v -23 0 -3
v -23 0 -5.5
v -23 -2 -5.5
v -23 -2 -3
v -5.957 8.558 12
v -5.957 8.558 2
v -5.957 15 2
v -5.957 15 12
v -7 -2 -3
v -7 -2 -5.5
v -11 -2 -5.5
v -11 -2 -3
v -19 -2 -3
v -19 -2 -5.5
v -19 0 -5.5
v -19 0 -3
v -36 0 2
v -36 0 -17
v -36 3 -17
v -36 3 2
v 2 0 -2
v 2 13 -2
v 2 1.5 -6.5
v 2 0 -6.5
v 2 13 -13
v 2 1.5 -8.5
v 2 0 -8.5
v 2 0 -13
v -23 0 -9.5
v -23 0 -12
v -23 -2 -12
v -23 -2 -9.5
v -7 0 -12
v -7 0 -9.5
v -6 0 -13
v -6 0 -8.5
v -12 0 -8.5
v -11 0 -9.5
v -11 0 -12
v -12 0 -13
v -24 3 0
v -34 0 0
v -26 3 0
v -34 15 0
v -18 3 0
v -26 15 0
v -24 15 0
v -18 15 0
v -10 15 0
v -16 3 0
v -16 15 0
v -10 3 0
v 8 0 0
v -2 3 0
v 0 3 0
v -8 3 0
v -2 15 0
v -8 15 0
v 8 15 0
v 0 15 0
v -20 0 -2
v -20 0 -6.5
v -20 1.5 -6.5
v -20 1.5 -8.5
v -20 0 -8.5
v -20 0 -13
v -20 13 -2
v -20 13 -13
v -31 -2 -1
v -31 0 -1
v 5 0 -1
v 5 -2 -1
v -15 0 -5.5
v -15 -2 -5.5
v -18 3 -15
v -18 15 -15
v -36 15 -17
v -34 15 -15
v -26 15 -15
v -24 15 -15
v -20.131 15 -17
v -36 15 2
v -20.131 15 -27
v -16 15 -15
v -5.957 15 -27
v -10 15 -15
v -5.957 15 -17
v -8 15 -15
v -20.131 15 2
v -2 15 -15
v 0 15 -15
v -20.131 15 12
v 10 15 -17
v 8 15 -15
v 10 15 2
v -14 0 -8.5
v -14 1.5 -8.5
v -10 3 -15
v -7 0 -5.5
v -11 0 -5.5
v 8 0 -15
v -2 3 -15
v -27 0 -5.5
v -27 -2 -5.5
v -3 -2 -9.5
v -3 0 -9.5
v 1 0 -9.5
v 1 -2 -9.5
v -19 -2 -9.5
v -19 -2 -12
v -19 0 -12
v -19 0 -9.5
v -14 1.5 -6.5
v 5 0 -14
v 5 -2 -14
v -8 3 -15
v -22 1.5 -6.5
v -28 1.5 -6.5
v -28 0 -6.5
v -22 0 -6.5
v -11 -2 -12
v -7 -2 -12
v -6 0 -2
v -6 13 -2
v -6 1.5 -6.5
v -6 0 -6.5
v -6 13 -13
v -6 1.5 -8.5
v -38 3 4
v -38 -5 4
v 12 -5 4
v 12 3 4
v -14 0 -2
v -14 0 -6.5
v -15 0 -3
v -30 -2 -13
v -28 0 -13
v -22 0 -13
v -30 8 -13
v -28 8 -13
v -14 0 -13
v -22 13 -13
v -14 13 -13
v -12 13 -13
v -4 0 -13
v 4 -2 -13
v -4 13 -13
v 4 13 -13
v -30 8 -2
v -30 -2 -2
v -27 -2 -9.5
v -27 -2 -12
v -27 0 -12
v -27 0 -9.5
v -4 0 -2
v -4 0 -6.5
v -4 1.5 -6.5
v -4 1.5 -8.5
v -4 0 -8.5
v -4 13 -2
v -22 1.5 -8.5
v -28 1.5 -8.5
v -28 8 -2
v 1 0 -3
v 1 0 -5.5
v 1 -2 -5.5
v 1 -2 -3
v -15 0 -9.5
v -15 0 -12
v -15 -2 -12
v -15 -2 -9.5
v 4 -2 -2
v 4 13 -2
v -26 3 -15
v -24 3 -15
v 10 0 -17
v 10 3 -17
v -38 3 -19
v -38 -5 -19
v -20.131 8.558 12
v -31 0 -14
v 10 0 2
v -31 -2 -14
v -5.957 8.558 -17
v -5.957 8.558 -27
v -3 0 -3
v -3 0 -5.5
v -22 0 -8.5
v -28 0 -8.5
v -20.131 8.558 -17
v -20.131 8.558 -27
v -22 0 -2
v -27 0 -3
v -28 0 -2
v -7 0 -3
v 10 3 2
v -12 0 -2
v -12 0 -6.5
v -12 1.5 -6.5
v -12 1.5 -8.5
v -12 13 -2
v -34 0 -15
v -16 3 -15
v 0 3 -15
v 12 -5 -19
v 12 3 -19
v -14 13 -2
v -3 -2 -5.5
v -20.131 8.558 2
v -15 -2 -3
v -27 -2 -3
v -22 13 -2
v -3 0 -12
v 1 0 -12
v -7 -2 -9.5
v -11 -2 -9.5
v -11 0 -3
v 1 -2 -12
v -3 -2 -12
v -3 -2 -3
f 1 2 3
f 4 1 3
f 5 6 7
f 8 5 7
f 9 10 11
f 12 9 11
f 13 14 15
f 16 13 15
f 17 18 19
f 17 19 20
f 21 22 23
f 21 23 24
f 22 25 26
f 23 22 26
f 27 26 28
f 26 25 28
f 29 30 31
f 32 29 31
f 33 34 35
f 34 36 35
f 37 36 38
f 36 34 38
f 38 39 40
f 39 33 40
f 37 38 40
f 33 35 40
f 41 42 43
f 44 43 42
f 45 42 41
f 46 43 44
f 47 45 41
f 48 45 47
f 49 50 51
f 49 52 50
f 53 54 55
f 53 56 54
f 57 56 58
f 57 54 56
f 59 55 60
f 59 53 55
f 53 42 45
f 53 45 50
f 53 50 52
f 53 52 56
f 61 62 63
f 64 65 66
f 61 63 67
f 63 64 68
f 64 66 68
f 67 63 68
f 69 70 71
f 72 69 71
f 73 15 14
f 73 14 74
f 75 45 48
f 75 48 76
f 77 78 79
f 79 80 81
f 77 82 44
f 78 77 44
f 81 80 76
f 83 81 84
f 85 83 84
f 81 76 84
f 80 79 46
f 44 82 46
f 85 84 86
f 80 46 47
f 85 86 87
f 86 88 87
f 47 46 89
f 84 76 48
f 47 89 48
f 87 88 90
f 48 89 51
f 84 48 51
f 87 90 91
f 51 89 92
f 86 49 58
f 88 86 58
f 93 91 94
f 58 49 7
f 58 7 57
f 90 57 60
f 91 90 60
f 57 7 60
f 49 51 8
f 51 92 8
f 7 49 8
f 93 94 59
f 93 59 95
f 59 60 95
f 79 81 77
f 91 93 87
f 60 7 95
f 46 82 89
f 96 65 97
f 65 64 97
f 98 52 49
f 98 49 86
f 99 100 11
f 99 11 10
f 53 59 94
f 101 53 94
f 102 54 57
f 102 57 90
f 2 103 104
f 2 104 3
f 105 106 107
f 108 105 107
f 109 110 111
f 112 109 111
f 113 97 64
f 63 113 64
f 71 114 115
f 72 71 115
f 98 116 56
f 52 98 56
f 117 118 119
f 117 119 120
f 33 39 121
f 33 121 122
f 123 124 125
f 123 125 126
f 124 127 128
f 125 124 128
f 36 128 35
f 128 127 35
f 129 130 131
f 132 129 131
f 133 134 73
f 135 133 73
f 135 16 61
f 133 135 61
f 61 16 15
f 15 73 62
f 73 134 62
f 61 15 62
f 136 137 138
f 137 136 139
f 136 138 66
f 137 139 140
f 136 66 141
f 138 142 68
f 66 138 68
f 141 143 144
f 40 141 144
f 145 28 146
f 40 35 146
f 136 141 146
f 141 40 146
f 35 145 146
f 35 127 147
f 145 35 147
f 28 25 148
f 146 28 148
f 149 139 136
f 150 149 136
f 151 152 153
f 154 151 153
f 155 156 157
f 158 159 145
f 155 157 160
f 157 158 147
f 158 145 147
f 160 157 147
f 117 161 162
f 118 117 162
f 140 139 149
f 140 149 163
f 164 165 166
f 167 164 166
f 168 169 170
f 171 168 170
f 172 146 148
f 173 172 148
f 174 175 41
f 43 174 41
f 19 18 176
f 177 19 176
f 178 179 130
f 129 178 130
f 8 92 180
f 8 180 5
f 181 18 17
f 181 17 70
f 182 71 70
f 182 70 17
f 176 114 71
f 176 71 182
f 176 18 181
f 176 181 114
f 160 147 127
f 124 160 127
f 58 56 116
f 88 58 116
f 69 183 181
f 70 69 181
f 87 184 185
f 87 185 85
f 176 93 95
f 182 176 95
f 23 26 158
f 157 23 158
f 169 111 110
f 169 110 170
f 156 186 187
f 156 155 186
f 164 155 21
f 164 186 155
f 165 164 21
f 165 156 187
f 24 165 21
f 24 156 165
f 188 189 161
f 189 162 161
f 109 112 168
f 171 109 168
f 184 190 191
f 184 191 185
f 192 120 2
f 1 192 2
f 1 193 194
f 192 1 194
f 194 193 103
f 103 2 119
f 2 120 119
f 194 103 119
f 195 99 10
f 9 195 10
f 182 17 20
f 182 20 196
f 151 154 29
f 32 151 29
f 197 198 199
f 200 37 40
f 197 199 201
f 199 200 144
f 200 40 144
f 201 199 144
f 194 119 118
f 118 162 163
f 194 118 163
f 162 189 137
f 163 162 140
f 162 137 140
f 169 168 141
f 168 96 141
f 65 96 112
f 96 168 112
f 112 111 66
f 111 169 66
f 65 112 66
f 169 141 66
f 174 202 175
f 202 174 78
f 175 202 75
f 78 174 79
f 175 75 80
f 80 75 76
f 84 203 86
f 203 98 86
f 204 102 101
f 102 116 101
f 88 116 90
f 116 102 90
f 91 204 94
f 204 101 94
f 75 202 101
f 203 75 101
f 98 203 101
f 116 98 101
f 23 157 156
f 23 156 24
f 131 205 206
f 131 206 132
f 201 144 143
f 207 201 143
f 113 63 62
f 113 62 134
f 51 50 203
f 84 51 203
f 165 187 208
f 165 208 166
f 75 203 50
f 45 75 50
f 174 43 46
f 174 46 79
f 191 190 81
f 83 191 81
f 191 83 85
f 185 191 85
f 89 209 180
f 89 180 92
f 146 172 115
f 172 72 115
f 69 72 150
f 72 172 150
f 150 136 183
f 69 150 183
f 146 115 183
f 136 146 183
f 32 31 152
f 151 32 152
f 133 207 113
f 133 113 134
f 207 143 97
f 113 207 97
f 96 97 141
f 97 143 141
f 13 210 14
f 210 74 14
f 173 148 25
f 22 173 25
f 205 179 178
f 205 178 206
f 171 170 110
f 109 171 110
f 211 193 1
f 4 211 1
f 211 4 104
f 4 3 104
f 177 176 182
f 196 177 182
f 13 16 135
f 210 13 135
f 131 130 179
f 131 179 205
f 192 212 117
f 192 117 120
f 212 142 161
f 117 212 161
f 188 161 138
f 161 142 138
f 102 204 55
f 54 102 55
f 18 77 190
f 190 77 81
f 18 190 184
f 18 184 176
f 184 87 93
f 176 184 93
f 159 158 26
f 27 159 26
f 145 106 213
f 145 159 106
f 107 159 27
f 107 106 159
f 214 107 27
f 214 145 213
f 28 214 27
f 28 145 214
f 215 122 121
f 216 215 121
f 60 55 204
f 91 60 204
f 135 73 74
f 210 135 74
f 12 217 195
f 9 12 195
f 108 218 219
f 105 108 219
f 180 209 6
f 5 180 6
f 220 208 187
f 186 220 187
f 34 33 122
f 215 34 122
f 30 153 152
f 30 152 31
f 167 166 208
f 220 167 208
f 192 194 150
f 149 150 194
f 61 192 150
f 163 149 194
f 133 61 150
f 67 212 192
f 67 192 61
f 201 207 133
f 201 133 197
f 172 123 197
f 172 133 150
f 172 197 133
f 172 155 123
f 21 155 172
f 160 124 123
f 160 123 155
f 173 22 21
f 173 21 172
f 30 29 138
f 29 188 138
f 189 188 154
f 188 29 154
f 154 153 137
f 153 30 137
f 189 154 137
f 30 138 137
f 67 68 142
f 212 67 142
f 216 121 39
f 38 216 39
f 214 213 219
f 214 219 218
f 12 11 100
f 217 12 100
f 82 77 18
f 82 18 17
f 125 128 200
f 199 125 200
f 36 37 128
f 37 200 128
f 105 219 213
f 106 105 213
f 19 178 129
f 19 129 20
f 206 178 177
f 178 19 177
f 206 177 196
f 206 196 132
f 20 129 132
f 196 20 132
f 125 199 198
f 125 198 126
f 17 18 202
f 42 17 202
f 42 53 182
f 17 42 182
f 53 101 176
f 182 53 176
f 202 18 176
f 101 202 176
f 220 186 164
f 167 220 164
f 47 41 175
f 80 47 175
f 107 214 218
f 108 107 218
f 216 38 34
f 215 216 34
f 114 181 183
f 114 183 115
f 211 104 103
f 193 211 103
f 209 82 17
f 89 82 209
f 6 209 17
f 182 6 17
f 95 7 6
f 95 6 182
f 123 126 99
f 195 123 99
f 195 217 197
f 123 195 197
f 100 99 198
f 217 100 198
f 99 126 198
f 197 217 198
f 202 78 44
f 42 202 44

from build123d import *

# Parameters (mm, degrees)
SKETCH1_W                 = 6
SKETCH1_H                 = 15
BOSS_EXTRUDE1_DEPTH       = 15
SKETCH2_W                 = 2
SKETCH2_H                 = 11
CUT_EXTRUDE1_DEPTH        = 13
SKETCH3_W                 = 15
SKETCH3_H                 = 3
BOSS_EXTRUDE2_DEPTH       = 2
LPATTERN1_COUNT           = 5
LPATTERN1_PITCH           = 8
SKETCH6_W                 = 15
SKETCH6_H                 = 15
BOSS_EXTRUDE4_DEPTH       = 2
SKETCH8_W                 = 15
SKETCH8_H                 = 12
BOSS_EXTRUDE5_DEPTH       = 2
SKETCH9_W                 = 34
SKETCH9_H                 = 2
CUT_EXTRUDE2_DEPTH        = 1.5
SKETCH13_W                = 36
SKETCH13_H                = 13
SKETCH13_W_2              = 34
SKETCH13_H_2              = 11
BOSS_EXTRUDE9_DEPTH       = 2
SKETCH15_W                = 4
SKETCH15_H                = 2.5
BOSS_EXTRUDE10_DEPTH      = 2
LPATTERN2_COUNT           = 4
LPATTERN2_PITCH           = 8
BOSS_EXTRUDE11_DEPTH      = 5
BOSS_EXTRUDE11_DEPTH_BACK = 15
SKETCH17_W                = 46
SKETCH17_H                = 19
SPLIT2_START              = -5
SPLIT2_OUTLINE_W          = 46
SPLIT2_OUTLINE_H          = 19
SPLIT2_DEPTH              = 5
SPLIT2_2_OUTLINE_W        = 2
SPLIT2_2_OUTLINE_H        = 11
SPLIT2_2_DEPTH            = 13
SPLIT2_3_OUTLINE_W        = 6
SPLIT2_3_OUTLINE_H        = 2
SPLIT2_3_DEPTH            = 1.5
SPLIT2_START_2            = -13
SPLIT2_4_DEPTH            = 11
SPLIT2_START_3            = -17
SPLIT2_5_DEPTH            = 19
SPLIT2_6_OUTLINE_W        = 36
SPLIT2_6_OUTLINE_H        = 2
SPLIT2_6_DEPTH            = 3
SPLIT2_START_4            = -1
SPLIT2_7_OUTLINE_W        = 36
SPLIT2_7_OUTLINE_H        = 2
SPLIT2_7_DEPTH            = 3
SPLIT2_START_5            = -8.5
SPLIT2_8_DEPTH            = 2
SPLIT2_START_6            = -9.5
SPLIT2_9_OUTLINE_W        = 4
SPLIT2_9_OUTLINE_H        = 2
SPLIT2_9_DEPTH            = 4
SPLIT2_10_OUTLINE_W       = 4
SPLIT2_10_OUTLINE_H       = 2
SPLIT2_10_DEPTH           = 1
SPLIT2_START_7            = -3
SPLIT2_11_OUTLINE_W       = 4
SPLIT2_11_OUTLINE_H       = 2
SPLIT2_11_DEPTH           = 1
SKETCH18_W                = 14.174743238
SKETCH18_H                = 6.442150942
BOSS_EXTRUDE12_DEPTH      = 10
SKETCH19_W                = 50
SKETCH19_H                = 23
SKETCH19_W_2              = 46
SKETCH19_H_2              = 19
BOSS_EXTRUDE13_DEPTH      = 8
SKETCH20_W                = 2
SKETCH20_H                = 11
CUT_EXTRUDE3_DEPTH        = 5


# Read off the part's stored shape, not the designer's step: Split2
with BuildPart() as part:
    # Sketch1 → Boss-Extrude1 (new body)
    with BuildSketch(Plane(origin=(0, 0, 0), x_dir=(1, 0, 0), z_dir=(0, 1, 0))):
        with Locations((3, 7.5)):
            Rectangle(SKETCH1_W, SKETCH1_H)
    extrude(amount=BOSS_EXTRUDE1_DEPTH)

    # Sketch2 → Cut-Extrude1 (cut)
    with BuildSketch(Plane.XZ):
        with Locations((3, -7.5)):
            Rectangle(SKETCH2_W, SKETCH2_H)
    extrude(amount=-CUT_EXTRUDE1_DEPTH, mode=Mode.SUBTRACT)

    # Sketch3 → Boss-Extrude2 (add)
    with BuildSketch(Plane.ZY):
        with Locations((-7.5, 1.5)):
            Rectangle(SKETCH3_W, SKETCH3_H)
    extrude(amount=BOSS_EXTRUDE2_DEPTH)


with BuildPart() as lpattern1_1:
    # LPattern1: pattern copy
    add(part.part.moved(Location(Vector(-1, 0, 0) * (1 * LPATTERN1_PITCH))))


with BuildPart() as lpattern1_2:
    # LPattern1: pattern copy
    add(part.part.moved(Location(Vector(-1, 0, 0) * (2 * LPATTERN1_PITCH))))


with BuildPart() as lpattern1_3:
    # LPattern1: pattern copy
    add(part.part.moved(Location(Vector(-1, 0, 0) * (3 * LPATTERN1_PITCH))))


with BuildPart() as lpattern1_4:
    # LPattern1: pattern copy
    add(part.part.moved(Location(Vector(-1, 0, 0) * (4 * LPATTERN1_PITCH))))


with BuildPart() as lpattern1_1_1:
    add(lpattern1_1.part)

    # Combine1: union LPattern1_2, LPattern1_3, part, LPattern1_4
    add(lpattern1_2.part)
    add(lpattern1_3.part)
    add(part.part)
    add(lpattern1_4.part)

    # Sketch6 → Boss-Extrude4 (add)
    with BuildSketch(Plane(origin=(6, 0, 0), x_dir=(0, 0, -1), z_dir=(1, 0, 0))):
        with Locations((7.5, 7.5)):
            Rectangle(SKETCH6_W, SKETCH6_H)
    extrude(amount=BOSS_EXTRUDE4_DEPTH)

    # Sketch8 → Boss-Extrude5 (add)
    with BuildSketch(Plane.ZY.offset(32)):
        with Locations((-7.5, 9)):
            Rectangle(SKETCH8_W, SKETCH8_H)
    extrude(amount=BOSS_EXTRUDE5_DEPTH)

    # Sketch9 → Cut-Extrude2 (cut)
    with BuildSketch(Plane.XZ):
        with Locations((-13, -7.5)):
            Rectangle(SKETCH9_W, SKETCH9_H)
    extrude(amount=-CUT_EXTRUDE2_DEPTH, mode=Mode.SUBTRACT)

    # Sketch13 → Boss-Extrude9 (add)
    with BuildSketch(Plane(origin=(0, 0, 0), x_dir=(-1, 0, 0), z_dir=(0, -1, 0))):
        with Locations((13, 7.5)):
            Rectangle(SKETCH13_W, SKETCH13_H)
        with Locations((13, 7.5)):
            Rectangle(SKETCH13_W_2, SKETCH13_H_2, mode=Mode.SUBTRACT)
    extrude(amount=BOSS_EXTRUDE9_DEPTH)

    # Sketch15 → Boss-Extrude10 (add)
    with BuildSketch(Plane(origin=(0, 0, 0), x_dir=(-1, 0, 0), z_dir=(0, -1, 0))):
        with Locations((25, 4.25)):
            Rectangle(SKETCH15_W, SKETCH15_H)
        with Locations((25, 10.75)):
            Rectangle(SKETCH15_W, SKETCH15_H)
    boss_extrude10 = extrude(amount=BOSS_EXTRUDE10_DEPTH)

    # LPattern2: Boss-Extrude10 ×4
    with Locations(*[(i * LPATTERN2_PITCH, 0, 0) for i in range(1, LPATTERN2_COUNT)]):
        add(boss_extrude10)


with BuildPart() as body_2:
    # Sketch17 → Boss-Extrude11 (new, two sides: drawn at the far end of the back side and taken through both)
    with BuildSketch(Plane.XZ.offset(-BOSS_EXTRUDE11_DEPTH_BACK)):
        with Locations((-13, -7.5)):
            Rectangle(SKETCH17_W, SKETCH17_H)
    extrude(amount=BOSS_EXTRUDE11_DEPTH + BOSS_EXTRUDE11_DEPTH_BACK)

    # Combine3: cut LPattern1_1
    add(lpattern1_1_1.part, mode=Mode.SUBTRACT)

    # Split2 outline → Split2 (cut)
    with BuildSketch(Plane(origin=(0, 0, 0), x_dir=(1, 0, 0), z_dir=(0, 1, 0)).offset(SPLIT2_START)):
        with Locations((-13, 7.5)):
            Rectangle(SPLIT2_OUTLINE_W, SPLIT2_OUTLINE_H)
    extrude(amount=SPLIT2_DEPTH, mode=Mode.SUBTRACT)

    # Split2 2 outline → Split2 2 (cut)
    with BuildSketch(Plane(origin=(0, 0, 0), x_dir=(1, 0, 0), z_dir=(0, 1, 0))):
        with Locations((3, 7.5)):
            Rectangle(SPLIT2_2_OUTLINE_W, SPLIT2_2_OUTLINE_H)
        with Locations((-5, 7.5)):
            Rectangle(SPLIT2_2_OUTLINE_W, SPLIT2_2_OUTLINE_H)
        with Locations((-13, 7.5)):
            Rectangle(SPLIT2_2_OUTLINE_W, SPLIT2_2_OUTLINE_H)
        with Locations((-21, 7.5)):
            Rectangle(SPLIT2_2_OUTLINE_W, SPLIT2_2_OUTLINE_H)
        with Locations((-29, 7.5)):
            Rectangle(SPLIT2_2_OUTLINE_W, SPLIT2_2_OUTLINE_H)
    extrude(amount=SPLIT2_2_DEPTH, mode=Mode.SUBTRACT)

    # Split2 3 outline → Split2 3 (cut)
    with BuildSketch(Plane(origin=(0, 0, 0), x_dir=(1, 0, 0), z_dir=(0, 1, 0))):
        with Locations((-1, 7.5)):
            Rectangle(SPLIT2_3_OUTLINE_W, SPLIT2_3_OUTLINE_H)
        with Locations((-9, 7.5)):
            Rectangle(SPLIT2_3_OUTLINE_W, SPLIT2_3_OUTLINE_H)
        with Locations((-17, 7.5)):
            Rectangle(SPLIT2_3_OUTLINE_W, SPLIT2_3_OUTLINE_H)
        with Locations((-25, 7.5)):
            Rectangle(SPLIT2_3_OUTLINE_W, SPLIT2_3_OUTLINE_H)
    extrude(amount=SPLIT2_3_DEPTH, mode=Mode.SUBTRACT)

    # Sketch18 → Boss-Extrude12 (add)
    with BuildSketch(Plane.XY.offset(2)):
        with Locations((-13.043964225, 11.778924529)):
            Rectangle(SKETCH18_W, SKETCH18_H)
    boss_extrude12 = extrude(amount=BOSS_EXTRUDE12_DEPTH)

    # Mirror2: Boss-Extrude12 across plane
    add(boss_extrude12.mirror(Plane.XY.offset(-7.5)))


with BuildPart() as body_2_2:
    # Split2 4 outline → Split2 4 (new body)
    with BuildSketch(Plane.XY.offset(SPLIT2_START_2)):
        Polygon((-4, 0), (-4, 13), (-6, 13), (-6, 0), (-7, 0), (-7, -2), (-11, -2), (-11, 0), (-12, 0), (-12, 13), (-14, 13), (-14, 0), (-15, 0), (-15, -2), (-19, -2), (-19, 0), (-20, 0), (-20, 13), (-22, 13), (-22, 0), (-23, 0), (-23, -2), (-27, -2), (-27, 0), (-28, 0), (-28, 13), (-30, 13), (-30, -2), (-31, -2), (-31, 0), (-36, 0), (-36, -5), (10, -5), (10, 0), (5, 0), (5, -2), (4, -2), (4, 13), (2, 13), (2, 0), (1, 0), (1, -2), (-3, -2), (-3, 0), align=None)
    extrude(amount=SPLIT2_4_DEPTH)

    # Split2 5 outline → Split2 5 (add)
    with BuildSketch(Plane.XY.offset(SPLIT2_START_3)):
        Polygon((5, -2), (-31, -2), (-31, 0), (-36, 0), (-36, -5), (10, -5), (10, 0), (5, 0), align=None)
    extrude(amount=SPLIT2_5_DEPTH)

    # Split2 6 outline → Split2 6 (add)
    with BuildSketch(Plane.XY.offset(SPLIT2_START_3)):
        with Locations((-13, -1)):
            Rectangle(SPLIT2_6_OUTLINE_W, SPLIT2_6_OUTLINE_H)
    extrude(amount=SPLIT2_6_DEPTH)

    # Split2 7 outline → Split2 7 (add)
    with BuildSketch(Plane.XY.offset(SPLIT2_START_4)):
        with Locations((-13, -1)):
            Rectangle(SPLIT2_7_OUTLINE_W, SPLIT2_7_OUTLINE_H)
    extrude(amount=SPLIT2_7_DEPTH)

    # Split2 8 outline → Split2 8 (add)
    with BuildSketch(Plane.XY.offset(SPLIT2_START_5)):
        Polygon((2, 1.5), (-4, 1.5), (-4, 0), (-3, 0), (-3, -2), (1, -2), (1, 0), (2, 0), align=None)
        Polygon((-7, 0), (-6, 0), (-6, 1.5), (-12, 1.5), (-12, 0), (-11, 0), (-11, -2), (-7, -2), align=None)
        Polygon((-19, -2), (-15, -2), (-15, 0), (-14, 0), (-14, 1.5), (-20, 1.5), (-20, 0), (-19, 0), align=None)
        Polygon((-27, -2), (-23, -2), (-23, 0), (-22, 0), (-22, 1.5), (-28, 1.5), (-28, 0), (-27, 0), align=None)
    extrude(amount=SPLIT2_8_DEPTH)

    # Split2 9 outline → Split2 9 (add)
    with BuildSketch(Plane.XY.offset(SPLIT2_START_6)):
        with Locations((-1, -1)):
            Rectangle(SPLIT2_9_OUTLINE_W, SPLIT2_9_OUTLINE_H)
        with Locations((-9, -1)):
            Rectangle(SPLIT2_9_OUTLINE_W, SPLIT2_9_OUTLINE_H)
        with Locations((-17, -1)):
            Rectangle(SPLIT2_9_OUTLINE_W, SPLIT2_9_OUTLINE_H)
        with Locations((-25, -1)):
            Rectangle(SPLIT2_9_OUTLINE_W, SPLIT2_9_OUTLINE_H)
    extrude(amount=SPLIT2_9_DEPTH)

    # Split2 10 outline → Split2 10 (add)
    with BuildSketch(Plane.XY.offset(SPLIT2_START_2)):
        with Locations((-1, -1)):
            Rectangle(SPLIT2_10_OUTLINE_W, SPLIT2_10_OUTLINE_H)
        with Locations((-9, -1)):
            Rectangle(SPLIT2_10_OUTLINE_W, SPLIT2_10_OUTLINE_H)
        with Locations((-17, -1)):
            Rectangle(SPLIT2_10_OUTLINE_W, SPLIT2_10_OUTLINE_H)
        with Locations((-25, -1)):
            Rectangle(SPLIT2_10_OUTLINE_W, SPLIT2_10_OUTLINE_H)
    extrude(amount=SPLIT2_10_DEPTH)

    # Split2 11 outline → Split2 11 (add)
    with BuildSketch(Plane.XY.offset(SPLIT2_START_7)):
        with Locations((-1, -1)):
            Rectangle(SPLIT2_11_OUTLINE_W, SPLIT2_11_OUTLINE_H)
        with Locations((-9, -1)):
            Rectangle(SPLIT2_11_OUTLINE_W, SPLIT2_11_OUTLINE_H)
        with Locations((-17, -1)):
            Rectangle(SPLIT2_11_OUTLINE_W, SPLIT2_11_OUTLINE_H)
        with Locations((-25, -1)):
            Rectangle(SPLIT2_11_OUTLINE_W, SPLIT2_11_OUTLINE_H)
    extrude(amount=SPLIT2_11_DEPTH)

    # Sketch19 → Boss-Extrude13 (add)
    with BuildSketch(Plane.XZ.offset(5)):
        with Locations((-13, -7.5)):
            Rectangle(SKETCH19_W, SKETCH19_H)
        with Locations((-13, -7.5)):
            Rectangle(SKETCH19_W_2, SKETCH19_H_2, mode=Mode.SUBTRACT)
    extrude(amount=-BOSS_EXTRUDE13_DEPTH)

    # Sketch20 → Cut-Extrude3 (cut)
    with BuildSketch(Plane(origin=(0, 13, 0), x_dir=(1, 0, 0), z_dir=(0, 1, 0))):
        with Locations((-29, 7.5)):
            Rectangle(SKETCH20_W, SKETCH20_H)
    extrude(amount=-CUT_EXTRUDE3_DEPTH, mode=Mode.SUBTRACT)


solid = Compound([body_2.part, body_2_2.part])
